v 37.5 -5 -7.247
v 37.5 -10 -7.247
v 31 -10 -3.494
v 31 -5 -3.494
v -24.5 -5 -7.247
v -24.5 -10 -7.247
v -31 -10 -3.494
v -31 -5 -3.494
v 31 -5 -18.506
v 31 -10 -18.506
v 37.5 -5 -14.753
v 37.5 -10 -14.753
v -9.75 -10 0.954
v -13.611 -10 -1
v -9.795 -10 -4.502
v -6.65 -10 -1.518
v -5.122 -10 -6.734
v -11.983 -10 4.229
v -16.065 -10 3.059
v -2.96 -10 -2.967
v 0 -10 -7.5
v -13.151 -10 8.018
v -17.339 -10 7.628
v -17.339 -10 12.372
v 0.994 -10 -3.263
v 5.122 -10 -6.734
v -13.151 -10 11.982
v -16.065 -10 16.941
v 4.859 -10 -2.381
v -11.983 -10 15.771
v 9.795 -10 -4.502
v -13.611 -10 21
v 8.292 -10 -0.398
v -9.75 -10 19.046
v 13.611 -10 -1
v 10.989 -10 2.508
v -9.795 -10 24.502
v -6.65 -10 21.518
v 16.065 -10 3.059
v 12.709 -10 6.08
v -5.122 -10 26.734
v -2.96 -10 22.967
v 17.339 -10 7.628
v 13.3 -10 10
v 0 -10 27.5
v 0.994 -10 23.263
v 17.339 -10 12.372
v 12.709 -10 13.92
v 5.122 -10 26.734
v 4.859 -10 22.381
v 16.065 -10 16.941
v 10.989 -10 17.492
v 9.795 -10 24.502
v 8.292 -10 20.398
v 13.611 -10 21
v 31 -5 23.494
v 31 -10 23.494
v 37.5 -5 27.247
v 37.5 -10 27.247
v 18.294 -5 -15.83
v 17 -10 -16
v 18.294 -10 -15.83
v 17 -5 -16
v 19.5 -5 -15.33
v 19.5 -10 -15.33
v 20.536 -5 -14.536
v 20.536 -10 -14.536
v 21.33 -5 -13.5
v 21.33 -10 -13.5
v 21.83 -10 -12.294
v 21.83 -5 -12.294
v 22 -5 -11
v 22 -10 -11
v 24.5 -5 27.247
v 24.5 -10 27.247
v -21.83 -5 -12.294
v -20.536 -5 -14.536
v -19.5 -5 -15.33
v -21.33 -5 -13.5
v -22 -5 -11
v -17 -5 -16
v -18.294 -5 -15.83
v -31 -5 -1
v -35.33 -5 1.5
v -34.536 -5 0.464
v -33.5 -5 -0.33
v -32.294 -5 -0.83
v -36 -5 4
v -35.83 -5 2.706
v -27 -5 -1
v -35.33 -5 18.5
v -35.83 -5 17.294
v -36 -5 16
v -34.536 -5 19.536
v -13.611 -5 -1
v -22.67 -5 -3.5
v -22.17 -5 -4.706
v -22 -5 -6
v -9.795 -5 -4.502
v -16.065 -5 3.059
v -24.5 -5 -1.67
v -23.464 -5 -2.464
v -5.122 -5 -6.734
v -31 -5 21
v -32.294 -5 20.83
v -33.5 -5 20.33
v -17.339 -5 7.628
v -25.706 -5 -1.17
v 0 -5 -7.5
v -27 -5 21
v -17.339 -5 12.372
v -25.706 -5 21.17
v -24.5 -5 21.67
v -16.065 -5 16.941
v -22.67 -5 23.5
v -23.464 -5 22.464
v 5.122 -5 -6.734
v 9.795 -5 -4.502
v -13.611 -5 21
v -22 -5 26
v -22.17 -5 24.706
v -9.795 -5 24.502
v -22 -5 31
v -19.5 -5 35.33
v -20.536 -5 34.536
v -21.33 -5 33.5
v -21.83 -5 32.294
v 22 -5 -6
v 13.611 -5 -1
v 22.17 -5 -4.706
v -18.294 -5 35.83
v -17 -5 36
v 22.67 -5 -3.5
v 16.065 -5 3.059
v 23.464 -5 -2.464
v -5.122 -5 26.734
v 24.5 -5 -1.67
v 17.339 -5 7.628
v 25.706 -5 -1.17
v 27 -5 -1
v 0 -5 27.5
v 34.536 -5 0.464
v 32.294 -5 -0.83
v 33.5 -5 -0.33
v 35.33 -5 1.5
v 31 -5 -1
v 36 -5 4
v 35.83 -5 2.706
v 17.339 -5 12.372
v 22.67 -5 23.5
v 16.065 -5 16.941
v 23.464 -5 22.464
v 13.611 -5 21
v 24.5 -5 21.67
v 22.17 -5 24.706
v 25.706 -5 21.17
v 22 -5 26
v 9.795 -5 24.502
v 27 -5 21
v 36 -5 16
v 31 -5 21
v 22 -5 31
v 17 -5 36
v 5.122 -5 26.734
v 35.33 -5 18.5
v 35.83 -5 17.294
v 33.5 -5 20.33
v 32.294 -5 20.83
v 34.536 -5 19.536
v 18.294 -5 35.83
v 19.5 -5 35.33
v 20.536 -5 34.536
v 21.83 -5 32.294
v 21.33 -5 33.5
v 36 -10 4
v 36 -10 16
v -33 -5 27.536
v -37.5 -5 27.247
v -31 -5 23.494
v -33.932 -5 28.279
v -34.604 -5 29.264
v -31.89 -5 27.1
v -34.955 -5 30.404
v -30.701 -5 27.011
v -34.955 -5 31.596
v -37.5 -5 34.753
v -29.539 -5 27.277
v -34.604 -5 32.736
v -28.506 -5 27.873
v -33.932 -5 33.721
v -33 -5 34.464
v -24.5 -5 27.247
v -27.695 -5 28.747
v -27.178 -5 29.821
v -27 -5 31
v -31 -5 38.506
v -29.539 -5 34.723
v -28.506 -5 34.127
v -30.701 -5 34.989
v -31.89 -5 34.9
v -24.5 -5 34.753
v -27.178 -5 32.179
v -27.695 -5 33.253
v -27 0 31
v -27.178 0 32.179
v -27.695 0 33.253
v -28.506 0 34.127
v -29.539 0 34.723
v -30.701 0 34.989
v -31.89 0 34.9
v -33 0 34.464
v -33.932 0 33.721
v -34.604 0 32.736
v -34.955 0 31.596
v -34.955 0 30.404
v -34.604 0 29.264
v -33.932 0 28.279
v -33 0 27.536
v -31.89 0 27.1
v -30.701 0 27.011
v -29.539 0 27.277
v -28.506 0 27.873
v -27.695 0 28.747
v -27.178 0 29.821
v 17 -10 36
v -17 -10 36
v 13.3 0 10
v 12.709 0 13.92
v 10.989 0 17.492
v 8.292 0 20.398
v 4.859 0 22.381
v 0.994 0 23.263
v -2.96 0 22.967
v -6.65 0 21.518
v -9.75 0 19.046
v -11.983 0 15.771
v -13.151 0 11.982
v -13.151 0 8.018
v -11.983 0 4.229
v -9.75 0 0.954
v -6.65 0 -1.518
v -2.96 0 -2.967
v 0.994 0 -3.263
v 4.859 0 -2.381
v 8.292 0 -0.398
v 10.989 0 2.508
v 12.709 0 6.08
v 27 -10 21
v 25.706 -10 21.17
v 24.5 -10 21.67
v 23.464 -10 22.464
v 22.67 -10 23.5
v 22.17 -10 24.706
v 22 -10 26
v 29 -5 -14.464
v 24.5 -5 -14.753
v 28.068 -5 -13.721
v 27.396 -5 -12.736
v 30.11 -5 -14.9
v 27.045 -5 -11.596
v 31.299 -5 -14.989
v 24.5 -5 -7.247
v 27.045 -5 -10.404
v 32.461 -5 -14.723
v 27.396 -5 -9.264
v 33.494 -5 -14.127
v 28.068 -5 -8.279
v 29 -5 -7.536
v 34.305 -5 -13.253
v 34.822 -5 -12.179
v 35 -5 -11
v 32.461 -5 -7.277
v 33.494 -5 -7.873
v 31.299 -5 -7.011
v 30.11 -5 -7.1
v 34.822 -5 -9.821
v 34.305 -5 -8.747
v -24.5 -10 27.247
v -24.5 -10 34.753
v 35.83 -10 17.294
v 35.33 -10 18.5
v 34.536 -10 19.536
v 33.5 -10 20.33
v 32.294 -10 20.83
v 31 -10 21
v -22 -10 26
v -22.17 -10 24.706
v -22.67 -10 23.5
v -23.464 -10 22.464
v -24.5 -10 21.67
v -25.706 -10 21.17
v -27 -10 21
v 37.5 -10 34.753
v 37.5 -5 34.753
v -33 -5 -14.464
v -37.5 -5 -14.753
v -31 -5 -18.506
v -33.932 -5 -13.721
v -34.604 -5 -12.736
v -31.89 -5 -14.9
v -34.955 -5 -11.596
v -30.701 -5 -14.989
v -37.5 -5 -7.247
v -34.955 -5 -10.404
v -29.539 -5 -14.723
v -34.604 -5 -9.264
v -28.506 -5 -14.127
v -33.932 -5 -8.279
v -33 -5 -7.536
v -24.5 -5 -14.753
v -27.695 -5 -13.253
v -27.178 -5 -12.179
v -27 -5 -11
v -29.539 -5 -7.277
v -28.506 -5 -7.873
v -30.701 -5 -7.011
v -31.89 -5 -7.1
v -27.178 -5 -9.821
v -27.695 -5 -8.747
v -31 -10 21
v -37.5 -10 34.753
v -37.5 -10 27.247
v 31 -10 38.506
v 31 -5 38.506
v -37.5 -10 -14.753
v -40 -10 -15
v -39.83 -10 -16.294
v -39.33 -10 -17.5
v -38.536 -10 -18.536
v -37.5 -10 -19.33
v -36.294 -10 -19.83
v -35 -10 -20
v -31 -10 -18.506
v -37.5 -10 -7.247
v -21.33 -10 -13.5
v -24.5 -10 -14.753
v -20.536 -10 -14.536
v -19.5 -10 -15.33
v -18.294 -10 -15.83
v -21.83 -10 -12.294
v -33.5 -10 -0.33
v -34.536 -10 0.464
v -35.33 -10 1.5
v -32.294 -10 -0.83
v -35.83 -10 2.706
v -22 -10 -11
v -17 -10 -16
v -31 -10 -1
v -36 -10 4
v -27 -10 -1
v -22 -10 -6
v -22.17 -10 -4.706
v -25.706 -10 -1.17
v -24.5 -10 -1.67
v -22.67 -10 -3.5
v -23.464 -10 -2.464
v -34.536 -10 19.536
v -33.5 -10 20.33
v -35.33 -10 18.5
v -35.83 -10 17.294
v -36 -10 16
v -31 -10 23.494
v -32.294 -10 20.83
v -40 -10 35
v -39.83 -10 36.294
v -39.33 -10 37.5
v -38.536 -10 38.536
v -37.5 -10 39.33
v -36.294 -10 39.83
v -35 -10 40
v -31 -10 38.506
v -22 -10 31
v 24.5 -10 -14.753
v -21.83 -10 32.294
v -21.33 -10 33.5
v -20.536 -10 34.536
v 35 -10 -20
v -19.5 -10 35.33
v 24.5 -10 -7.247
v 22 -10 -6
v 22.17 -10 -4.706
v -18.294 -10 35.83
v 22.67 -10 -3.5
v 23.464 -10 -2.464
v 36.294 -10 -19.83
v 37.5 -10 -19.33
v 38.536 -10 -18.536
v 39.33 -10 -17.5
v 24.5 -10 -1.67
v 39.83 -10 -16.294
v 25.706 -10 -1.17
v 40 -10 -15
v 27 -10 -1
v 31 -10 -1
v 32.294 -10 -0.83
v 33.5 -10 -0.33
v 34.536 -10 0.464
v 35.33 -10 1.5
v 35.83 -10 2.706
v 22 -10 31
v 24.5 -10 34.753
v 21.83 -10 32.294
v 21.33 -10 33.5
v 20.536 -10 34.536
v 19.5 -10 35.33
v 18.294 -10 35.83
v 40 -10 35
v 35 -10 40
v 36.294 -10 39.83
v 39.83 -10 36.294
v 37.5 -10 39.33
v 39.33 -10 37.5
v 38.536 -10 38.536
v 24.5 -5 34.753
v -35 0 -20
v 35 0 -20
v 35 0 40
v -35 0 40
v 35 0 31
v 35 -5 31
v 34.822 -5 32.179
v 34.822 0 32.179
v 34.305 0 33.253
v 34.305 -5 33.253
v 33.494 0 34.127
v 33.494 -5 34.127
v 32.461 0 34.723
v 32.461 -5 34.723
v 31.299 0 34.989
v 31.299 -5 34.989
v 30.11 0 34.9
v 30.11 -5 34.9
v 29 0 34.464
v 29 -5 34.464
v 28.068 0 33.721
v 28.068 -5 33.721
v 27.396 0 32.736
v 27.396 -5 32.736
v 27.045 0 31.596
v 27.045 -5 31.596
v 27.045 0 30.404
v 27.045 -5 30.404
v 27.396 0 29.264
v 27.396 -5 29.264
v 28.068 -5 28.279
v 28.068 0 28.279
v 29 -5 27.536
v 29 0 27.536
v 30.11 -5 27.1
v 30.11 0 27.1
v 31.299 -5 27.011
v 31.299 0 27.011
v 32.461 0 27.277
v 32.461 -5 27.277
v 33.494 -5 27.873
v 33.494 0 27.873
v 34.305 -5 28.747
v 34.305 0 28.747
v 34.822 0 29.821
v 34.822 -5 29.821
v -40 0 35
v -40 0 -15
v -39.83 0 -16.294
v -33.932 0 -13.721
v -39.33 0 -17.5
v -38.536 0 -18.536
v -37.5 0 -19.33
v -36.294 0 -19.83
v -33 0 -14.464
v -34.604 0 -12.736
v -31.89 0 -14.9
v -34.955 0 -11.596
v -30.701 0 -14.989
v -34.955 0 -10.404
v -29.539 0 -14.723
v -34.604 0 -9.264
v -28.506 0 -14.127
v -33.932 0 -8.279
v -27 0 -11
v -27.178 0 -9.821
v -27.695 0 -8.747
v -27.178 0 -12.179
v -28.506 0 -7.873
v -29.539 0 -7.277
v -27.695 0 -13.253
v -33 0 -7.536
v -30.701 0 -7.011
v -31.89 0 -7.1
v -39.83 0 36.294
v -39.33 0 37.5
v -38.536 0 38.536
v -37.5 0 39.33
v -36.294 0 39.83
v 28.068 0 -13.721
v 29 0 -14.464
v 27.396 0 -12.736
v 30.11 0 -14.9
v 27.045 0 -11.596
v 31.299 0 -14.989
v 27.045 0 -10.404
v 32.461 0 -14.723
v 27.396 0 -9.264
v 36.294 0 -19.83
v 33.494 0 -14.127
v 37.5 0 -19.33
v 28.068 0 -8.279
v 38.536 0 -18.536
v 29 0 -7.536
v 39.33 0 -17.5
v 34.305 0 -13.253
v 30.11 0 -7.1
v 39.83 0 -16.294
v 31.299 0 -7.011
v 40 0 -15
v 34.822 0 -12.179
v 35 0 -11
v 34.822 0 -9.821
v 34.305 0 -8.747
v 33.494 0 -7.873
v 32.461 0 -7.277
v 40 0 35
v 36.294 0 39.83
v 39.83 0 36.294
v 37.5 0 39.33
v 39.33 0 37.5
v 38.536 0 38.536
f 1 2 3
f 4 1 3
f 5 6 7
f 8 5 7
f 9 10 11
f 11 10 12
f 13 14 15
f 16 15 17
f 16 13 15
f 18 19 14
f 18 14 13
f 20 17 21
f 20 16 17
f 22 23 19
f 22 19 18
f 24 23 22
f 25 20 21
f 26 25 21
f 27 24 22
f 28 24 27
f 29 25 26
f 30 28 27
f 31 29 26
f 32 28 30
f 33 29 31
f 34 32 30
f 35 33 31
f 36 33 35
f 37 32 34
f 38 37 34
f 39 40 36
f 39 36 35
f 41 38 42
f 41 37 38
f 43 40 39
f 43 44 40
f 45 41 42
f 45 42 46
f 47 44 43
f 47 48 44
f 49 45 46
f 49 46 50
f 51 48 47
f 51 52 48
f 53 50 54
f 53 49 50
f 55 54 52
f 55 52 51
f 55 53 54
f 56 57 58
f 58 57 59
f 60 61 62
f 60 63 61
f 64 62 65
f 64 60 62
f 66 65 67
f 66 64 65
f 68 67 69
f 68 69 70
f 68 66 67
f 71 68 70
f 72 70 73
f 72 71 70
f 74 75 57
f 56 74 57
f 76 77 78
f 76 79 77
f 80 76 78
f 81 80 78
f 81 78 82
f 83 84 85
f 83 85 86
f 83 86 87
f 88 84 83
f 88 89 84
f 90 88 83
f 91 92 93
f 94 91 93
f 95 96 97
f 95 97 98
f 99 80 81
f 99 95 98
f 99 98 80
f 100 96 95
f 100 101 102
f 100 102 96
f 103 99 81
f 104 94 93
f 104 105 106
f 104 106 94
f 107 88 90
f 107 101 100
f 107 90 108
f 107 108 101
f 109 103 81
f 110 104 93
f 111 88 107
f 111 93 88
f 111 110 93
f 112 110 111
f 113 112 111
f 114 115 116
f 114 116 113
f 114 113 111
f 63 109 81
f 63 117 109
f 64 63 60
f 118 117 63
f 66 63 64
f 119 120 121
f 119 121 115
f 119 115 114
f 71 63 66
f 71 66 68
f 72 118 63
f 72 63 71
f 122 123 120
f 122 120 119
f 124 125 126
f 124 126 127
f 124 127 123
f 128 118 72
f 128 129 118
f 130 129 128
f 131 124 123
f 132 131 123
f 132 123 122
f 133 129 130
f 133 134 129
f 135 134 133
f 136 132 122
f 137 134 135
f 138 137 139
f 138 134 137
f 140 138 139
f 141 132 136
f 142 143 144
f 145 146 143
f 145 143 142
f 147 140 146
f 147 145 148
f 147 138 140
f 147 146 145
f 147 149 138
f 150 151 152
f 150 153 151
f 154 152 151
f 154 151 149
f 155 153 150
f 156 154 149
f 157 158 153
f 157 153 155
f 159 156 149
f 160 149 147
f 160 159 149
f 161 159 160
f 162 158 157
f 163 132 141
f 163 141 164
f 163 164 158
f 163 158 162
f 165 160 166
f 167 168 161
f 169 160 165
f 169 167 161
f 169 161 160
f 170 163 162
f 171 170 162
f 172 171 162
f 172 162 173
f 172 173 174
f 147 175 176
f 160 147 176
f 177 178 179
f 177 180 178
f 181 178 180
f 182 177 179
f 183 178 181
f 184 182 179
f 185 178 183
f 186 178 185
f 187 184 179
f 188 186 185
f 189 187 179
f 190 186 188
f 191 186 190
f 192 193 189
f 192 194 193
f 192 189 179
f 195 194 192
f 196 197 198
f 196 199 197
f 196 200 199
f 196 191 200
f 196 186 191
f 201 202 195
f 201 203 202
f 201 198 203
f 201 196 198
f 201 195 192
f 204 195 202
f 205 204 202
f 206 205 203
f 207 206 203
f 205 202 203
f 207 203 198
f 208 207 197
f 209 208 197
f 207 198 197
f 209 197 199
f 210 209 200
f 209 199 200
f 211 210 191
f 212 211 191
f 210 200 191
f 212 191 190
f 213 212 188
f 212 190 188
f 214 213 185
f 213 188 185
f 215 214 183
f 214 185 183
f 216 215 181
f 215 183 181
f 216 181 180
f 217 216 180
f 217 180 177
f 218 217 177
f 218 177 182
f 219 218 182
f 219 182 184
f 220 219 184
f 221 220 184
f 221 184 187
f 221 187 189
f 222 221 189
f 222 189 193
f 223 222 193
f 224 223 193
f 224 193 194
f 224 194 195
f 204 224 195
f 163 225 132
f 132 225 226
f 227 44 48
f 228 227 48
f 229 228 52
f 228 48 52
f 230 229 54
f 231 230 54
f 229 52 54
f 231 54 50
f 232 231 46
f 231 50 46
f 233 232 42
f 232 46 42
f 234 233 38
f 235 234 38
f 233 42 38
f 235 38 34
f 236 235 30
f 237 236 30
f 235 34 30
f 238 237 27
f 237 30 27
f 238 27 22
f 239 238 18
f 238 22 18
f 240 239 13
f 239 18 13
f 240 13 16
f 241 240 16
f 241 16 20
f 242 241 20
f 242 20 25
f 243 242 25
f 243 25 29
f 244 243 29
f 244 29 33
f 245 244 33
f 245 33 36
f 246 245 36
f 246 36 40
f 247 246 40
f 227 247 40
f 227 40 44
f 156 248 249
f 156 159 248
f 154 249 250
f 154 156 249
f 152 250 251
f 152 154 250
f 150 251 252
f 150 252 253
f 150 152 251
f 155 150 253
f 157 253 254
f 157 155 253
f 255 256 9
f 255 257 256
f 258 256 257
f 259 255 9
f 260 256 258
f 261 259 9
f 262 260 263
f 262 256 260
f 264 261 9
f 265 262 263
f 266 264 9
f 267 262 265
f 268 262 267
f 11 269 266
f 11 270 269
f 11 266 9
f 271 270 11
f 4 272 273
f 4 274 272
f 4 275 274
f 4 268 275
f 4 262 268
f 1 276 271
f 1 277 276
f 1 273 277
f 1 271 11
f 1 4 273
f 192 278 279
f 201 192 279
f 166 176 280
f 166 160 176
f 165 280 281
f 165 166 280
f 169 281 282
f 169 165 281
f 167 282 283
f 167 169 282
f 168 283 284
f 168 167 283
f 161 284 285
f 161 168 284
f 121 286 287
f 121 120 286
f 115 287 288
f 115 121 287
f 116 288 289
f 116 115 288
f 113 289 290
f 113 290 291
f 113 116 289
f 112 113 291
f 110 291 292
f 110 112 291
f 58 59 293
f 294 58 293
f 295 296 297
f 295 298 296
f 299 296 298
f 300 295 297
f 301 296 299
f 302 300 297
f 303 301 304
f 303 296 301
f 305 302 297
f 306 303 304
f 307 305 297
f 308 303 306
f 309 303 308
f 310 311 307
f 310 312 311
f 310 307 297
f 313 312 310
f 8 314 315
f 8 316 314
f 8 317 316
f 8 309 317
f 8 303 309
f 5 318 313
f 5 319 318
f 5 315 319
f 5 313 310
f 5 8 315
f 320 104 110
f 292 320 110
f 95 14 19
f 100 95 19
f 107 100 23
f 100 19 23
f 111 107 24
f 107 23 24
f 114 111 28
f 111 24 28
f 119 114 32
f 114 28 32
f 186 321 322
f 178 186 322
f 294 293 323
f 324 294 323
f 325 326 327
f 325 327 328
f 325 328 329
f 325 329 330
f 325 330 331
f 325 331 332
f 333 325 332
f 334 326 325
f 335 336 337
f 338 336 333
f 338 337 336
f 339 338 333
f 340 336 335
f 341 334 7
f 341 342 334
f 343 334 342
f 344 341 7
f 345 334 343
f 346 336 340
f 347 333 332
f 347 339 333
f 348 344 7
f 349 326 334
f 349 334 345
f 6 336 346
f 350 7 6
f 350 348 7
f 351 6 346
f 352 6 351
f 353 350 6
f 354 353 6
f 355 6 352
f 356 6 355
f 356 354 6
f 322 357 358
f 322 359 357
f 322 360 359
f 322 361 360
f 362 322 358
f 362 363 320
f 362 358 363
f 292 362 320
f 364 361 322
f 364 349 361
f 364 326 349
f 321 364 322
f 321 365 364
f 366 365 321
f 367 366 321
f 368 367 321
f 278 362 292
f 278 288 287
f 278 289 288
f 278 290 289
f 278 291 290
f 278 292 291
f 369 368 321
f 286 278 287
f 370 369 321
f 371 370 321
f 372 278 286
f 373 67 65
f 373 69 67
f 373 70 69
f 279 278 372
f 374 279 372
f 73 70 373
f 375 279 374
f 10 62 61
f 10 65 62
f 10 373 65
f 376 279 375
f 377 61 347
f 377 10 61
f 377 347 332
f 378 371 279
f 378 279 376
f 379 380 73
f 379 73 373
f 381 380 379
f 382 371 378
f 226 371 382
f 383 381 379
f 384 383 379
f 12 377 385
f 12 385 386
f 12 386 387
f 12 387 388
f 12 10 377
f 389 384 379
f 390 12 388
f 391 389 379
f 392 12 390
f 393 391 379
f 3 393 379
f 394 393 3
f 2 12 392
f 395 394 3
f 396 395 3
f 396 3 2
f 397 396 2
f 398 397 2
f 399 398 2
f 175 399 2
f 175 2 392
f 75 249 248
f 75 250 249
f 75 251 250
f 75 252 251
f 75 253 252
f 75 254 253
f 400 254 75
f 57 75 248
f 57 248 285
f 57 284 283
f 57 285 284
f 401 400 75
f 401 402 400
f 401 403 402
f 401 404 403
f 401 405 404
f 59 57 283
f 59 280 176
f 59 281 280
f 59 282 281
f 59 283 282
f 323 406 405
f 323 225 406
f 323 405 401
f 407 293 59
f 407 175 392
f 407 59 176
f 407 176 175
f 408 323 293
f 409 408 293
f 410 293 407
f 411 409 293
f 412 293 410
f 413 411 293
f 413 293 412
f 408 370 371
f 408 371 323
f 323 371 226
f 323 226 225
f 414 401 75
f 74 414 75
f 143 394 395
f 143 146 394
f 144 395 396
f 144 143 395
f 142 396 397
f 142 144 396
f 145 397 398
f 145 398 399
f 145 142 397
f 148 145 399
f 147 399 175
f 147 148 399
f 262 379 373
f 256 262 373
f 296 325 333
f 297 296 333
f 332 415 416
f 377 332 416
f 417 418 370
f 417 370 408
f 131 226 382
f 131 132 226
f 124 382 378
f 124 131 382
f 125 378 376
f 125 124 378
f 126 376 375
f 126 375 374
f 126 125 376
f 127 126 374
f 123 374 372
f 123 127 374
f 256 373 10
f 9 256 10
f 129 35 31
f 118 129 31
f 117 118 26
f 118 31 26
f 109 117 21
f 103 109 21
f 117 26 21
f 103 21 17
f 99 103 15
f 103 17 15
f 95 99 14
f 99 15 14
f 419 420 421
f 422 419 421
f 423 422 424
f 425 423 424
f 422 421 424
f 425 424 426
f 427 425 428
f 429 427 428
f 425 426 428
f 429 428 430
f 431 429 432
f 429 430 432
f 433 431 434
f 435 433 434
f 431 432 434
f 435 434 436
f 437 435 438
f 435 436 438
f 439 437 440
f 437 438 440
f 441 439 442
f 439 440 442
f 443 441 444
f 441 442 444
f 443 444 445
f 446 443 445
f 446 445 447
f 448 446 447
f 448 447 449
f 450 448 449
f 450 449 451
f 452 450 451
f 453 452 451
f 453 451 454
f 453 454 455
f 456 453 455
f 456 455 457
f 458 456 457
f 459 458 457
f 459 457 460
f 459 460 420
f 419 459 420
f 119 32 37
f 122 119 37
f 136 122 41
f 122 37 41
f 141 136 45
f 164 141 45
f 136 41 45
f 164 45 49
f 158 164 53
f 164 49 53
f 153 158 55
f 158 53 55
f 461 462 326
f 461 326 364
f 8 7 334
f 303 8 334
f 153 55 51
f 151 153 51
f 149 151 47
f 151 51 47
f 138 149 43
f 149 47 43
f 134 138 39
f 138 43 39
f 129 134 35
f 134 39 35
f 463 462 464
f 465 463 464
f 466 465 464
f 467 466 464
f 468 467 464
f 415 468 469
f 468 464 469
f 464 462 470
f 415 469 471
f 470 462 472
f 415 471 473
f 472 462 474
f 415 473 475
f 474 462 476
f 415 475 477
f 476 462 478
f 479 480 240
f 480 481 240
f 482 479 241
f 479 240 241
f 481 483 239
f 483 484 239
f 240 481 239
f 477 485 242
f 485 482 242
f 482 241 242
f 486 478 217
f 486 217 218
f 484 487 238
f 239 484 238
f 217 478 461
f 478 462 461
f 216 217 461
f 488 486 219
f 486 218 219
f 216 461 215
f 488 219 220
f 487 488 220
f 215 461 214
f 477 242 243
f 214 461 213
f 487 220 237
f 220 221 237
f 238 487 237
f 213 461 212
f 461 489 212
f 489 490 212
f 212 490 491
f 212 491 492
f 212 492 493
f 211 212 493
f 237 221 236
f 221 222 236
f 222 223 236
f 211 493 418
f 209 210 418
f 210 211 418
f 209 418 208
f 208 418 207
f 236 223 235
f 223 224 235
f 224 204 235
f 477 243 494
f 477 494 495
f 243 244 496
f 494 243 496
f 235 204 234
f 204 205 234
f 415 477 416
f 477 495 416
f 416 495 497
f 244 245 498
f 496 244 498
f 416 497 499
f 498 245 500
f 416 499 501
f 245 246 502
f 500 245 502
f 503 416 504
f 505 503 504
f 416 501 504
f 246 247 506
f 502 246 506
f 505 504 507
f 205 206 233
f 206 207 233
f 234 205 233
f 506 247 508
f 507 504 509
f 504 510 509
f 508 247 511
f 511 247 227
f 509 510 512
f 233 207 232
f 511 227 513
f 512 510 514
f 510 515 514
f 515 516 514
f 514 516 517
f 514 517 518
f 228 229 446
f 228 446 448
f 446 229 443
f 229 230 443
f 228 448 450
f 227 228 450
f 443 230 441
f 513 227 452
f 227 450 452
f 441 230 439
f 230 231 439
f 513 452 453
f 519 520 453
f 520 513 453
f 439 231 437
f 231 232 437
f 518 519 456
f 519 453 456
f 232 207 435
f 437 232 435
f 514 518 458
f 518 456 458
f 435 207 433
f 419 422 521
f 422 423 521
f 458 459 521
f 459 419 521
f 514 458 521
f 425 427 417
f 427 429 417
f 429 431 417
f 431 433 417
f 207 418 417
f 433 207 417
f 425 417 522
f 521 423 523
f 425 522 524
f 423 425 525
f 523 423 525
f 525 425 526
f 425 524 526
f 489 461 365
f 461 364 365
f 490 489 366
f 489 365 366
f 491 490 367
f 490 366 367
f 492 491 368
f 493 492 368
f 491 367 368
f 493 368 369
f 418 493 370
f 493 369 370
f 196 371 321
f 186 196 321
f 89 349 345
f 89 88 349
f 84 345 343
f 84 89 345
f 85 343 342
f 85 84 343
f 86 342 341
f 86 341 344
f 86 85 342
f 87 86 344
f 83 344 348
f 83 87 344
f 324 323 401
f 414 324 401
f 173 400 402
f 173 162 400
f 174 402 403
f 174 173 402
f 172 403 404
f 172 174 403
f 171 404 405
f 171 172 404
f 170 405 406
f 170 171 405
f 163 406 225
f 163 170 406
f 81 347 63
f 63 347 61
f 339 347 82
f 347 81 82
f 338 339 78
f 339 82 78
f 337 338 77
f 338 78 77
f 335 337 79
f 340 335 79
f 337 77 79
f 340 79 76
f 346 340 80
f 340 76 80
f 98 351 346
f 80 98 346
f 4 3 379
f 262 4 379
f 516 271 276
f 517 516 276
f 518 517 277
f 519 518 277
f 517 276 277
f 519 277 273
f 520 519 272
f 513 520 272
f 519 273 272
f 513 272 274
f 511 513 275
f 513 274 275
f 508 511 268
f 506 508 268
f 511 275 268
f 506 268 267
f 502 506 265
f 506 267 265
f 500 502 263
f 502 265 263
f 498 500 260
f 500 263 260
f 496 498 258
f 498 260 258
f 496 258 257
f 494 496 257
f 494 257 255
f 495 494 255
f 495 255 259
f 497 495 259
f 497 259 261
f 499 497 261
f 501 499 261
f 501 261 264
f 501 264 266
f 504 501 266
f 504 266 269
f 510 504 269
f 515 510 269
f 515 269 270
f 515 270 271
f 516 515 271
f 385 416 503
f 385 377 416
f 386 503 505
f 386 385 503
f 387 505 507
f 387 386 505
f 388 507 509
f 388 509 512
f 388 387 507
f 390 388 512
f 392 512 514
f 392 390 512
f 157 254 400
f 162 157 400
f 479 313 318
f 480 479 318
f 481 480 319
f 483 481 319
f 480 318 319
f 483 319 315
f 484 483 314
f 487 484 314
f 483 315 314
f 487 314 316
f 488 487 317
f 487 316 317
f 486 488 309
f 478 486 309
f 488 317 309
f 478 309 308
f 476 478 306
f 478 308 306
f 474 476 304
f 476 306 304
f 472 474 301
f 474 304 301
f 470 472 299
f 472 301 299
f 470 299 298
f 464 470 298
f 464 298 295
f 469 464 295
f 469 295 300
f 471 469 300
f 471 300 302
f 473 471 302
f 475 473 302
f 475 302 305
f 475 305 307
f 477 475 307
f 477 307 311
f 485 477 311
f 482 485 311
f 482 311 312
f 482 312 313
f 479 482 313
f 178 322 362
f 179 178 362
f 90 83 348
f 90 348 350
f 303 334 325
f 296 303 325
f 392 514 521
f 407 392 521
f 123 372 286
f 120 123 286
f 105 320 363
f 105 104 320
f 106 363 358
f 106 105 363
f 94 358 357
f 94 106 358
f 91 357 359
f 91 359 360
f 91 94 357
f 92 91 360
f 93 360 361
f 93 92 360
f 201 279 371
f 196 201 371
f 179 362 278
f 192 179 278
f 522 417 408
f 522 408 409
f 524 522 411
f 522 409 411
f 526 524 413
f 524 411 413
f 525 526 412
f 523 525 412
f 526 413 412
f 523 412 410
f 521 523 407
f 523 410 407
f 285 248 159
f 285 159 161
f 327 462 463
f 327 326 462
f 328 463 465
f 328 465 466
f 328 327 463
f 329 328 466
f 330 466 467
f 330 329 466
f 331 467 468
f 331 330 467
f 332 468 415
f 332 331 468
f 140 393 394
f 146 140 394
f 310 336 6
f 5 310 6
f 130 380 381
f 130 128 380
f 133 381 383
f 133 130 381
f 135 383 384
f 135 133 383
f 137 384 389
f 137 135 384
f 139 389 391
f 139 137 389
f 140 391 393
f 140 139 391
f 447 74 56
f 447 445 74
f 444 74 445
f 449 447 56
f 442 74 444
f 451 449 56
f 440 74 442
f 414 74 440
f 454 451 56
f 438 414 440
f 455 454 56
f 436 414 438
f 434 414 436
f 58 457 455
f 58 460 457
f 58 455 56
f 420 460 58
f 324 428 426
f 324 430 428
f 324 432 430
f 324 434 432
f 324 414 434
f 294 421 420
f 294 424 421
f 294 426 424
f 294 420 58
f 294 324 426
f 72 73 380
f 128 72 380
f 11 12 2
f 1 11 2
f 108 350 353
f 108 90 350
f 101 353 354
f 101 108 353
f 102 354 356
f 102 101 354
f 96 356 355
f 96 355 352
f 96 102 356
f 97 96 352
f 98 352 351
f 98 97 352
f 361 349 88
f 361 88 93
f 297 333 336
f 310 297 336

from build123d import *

# Parameters (mm, degrees)
F0_W     = 80
F0_H     = 60
F1_DEPTH = 10
F2_R     = 13.3
F3_DEPTH = 10.001
F4_R     = 4
F5_DEPTH = 10.001
F6_R     = 5
F7_W     = 14
F7_H     = 22
F8_DEPTH = 5
F9_R     = 5


with BuildPart() as f1:
    # F0 (on Front) → F1 (new body)
    with BuildSketch(Plane.XZ):
        with Locations((0, 10)):
            Rectangle(F0_W, F0_H)
    extrude(amount=F1_DEPTH)

    # F2 (on face) → F3 (cut, through all)
    with BuildSketch(Plane.XZ.offset(10)):
        with Locations((0, 10)):
            Circle(F2_R)
    extrude(amount=-F3_DEPTH, mode=Mode.SUBTRACT)

    # F4 (on face) → F5 (cut, through all)
    with BuildSketch(Plane.XZ.offset(10)):
        with Locations((-31, 31)):
            Circle(F4_R)
        with Locations((31, 31)):
            Circle(F4_R)
        with Locations((-31, -11)):
            Circle(F4_R)
        with Locations((31, -11)):
            Circle(F4_R)
    extrude(amount=-F5_DEPTH, mode=Mode.SUBTRACT)

    # F6
    f6_edges = [f1.edges().sort_by_distance(p)[0] for p in [
        (40, -5, 40),
        (40, -5, -20),
        (-40, -5, -20),
        (-40, -5, 40),
    ]]
    fillet(f6_edges, radius=F6_R)

    # F7 (on face) → F8 (cut)
    with BuildSketch(Plane.XZ.offset(10)):
        Polygon((-24.5, 34.7527767497), (-31, 38.5055534995), (-37.5, 34.7527767497), (-37.5, 27.2472232503), (-31, 23.4944465005), (-24.5, 27.2472232503), align=None)
        Polygon((24.5, 34.7527767497), (24.5, 27.2472232503), (31, 23.4944465005), (37.5, 27.2472232503), (37.5, 34.7527767497), (31, 38.5055534995), align=None)
        Polygon((24.5, -7.2472232503), (24.5, -14.7527767497), (31, -18.5055534995), (37.5, -14.7527767497), (37.5, -7.2472232503), (31, -3.4944465005), align=None)
        Polygon((-24.5, -7.2472232503), (-31, -3.4944465005), (-37.5, -7.2472232503), (-37.5, -14.7527767497), (-31, -18.5055534995), (-24.5, -14.7527767497), align=None)
        with BuildLine():
            ThreePointArc((13.6106575888, 21), (16.499037969, 15.8336734651), (17.5, 10))
            ThreePointArc((17.5, 10), (16.499037969, 4.1663265349), (13.6106575888, -1))
            Line((13.6106575888, -1), (22, -1))
            Line((22, -1), (22, 21))
            Line((22, 21), (13.6106575888, 21))
        make_face()
        with BuildLine():
            ThreePointArc((-13.6106575888, 21), (0, 27.5), (13.6106575888, 21))
            Line((13.6106575888, 21), (22, 21))
            Line((22, 21), (22, 36))
            Line((22, 36), (-22, 36))
            Line((-22, 36), (-22, 21))
            Line((-22, 21), (-13.6106575888, 21))
        make_face()
        with BuildLine():
            Line((22, -1), (13.6106575888, -1))
            ThreePointArc((13.6106575888, -1), (0, -7.5), (-13.6106575888, -1))
            Line((-13.6106575888, -1), (-22, -1))
            Line((-22, -1), (-22, -16))
            Line((-22, -16), (22, -16))
            Line((22, -16), (22, -1))
        make_face()
        with BuildLine():
            ThreePointArc((-13.6106575888, -1), (-17.5, 10), (-13.6106575888, 21))
            Line((-13.6106575888, 21), (-22, 21))
            Line((-22, 21), (-22, -1))
            Line((-22, -1), (-13.6106575888, -1))
        make_face()
        with Locations((29, 10)):
            Rectangle(F7_W, F7_H)
        with Locations((-29, 10)):
            Rectangle(F7_W, F7_H)
    extrude(amount=-F8_DEPTH, mode=Mode.SUBTRACT)

    # F9
    f9_edges = [f1.edges().sort_by_distance(p)[0] for p in [
        (-22, -7.5, 21),
        (-36, -7.5, 21),
        (-22, -7.5, 36),
        (22, -7.5, 36),
        (22, -7.5, 21),
        (36, -7.5, 21),
        (-36, -7.5, -1),
        (-22, -7.5, -1),
        (-22, -7.5, -16),
        (36, -7.5, -1),
        (22, -7.5, -1),
        (22, -7.5, -16),
    ]]
    fillet(f9_edges, radius=F9_R)


solid = f1.part
